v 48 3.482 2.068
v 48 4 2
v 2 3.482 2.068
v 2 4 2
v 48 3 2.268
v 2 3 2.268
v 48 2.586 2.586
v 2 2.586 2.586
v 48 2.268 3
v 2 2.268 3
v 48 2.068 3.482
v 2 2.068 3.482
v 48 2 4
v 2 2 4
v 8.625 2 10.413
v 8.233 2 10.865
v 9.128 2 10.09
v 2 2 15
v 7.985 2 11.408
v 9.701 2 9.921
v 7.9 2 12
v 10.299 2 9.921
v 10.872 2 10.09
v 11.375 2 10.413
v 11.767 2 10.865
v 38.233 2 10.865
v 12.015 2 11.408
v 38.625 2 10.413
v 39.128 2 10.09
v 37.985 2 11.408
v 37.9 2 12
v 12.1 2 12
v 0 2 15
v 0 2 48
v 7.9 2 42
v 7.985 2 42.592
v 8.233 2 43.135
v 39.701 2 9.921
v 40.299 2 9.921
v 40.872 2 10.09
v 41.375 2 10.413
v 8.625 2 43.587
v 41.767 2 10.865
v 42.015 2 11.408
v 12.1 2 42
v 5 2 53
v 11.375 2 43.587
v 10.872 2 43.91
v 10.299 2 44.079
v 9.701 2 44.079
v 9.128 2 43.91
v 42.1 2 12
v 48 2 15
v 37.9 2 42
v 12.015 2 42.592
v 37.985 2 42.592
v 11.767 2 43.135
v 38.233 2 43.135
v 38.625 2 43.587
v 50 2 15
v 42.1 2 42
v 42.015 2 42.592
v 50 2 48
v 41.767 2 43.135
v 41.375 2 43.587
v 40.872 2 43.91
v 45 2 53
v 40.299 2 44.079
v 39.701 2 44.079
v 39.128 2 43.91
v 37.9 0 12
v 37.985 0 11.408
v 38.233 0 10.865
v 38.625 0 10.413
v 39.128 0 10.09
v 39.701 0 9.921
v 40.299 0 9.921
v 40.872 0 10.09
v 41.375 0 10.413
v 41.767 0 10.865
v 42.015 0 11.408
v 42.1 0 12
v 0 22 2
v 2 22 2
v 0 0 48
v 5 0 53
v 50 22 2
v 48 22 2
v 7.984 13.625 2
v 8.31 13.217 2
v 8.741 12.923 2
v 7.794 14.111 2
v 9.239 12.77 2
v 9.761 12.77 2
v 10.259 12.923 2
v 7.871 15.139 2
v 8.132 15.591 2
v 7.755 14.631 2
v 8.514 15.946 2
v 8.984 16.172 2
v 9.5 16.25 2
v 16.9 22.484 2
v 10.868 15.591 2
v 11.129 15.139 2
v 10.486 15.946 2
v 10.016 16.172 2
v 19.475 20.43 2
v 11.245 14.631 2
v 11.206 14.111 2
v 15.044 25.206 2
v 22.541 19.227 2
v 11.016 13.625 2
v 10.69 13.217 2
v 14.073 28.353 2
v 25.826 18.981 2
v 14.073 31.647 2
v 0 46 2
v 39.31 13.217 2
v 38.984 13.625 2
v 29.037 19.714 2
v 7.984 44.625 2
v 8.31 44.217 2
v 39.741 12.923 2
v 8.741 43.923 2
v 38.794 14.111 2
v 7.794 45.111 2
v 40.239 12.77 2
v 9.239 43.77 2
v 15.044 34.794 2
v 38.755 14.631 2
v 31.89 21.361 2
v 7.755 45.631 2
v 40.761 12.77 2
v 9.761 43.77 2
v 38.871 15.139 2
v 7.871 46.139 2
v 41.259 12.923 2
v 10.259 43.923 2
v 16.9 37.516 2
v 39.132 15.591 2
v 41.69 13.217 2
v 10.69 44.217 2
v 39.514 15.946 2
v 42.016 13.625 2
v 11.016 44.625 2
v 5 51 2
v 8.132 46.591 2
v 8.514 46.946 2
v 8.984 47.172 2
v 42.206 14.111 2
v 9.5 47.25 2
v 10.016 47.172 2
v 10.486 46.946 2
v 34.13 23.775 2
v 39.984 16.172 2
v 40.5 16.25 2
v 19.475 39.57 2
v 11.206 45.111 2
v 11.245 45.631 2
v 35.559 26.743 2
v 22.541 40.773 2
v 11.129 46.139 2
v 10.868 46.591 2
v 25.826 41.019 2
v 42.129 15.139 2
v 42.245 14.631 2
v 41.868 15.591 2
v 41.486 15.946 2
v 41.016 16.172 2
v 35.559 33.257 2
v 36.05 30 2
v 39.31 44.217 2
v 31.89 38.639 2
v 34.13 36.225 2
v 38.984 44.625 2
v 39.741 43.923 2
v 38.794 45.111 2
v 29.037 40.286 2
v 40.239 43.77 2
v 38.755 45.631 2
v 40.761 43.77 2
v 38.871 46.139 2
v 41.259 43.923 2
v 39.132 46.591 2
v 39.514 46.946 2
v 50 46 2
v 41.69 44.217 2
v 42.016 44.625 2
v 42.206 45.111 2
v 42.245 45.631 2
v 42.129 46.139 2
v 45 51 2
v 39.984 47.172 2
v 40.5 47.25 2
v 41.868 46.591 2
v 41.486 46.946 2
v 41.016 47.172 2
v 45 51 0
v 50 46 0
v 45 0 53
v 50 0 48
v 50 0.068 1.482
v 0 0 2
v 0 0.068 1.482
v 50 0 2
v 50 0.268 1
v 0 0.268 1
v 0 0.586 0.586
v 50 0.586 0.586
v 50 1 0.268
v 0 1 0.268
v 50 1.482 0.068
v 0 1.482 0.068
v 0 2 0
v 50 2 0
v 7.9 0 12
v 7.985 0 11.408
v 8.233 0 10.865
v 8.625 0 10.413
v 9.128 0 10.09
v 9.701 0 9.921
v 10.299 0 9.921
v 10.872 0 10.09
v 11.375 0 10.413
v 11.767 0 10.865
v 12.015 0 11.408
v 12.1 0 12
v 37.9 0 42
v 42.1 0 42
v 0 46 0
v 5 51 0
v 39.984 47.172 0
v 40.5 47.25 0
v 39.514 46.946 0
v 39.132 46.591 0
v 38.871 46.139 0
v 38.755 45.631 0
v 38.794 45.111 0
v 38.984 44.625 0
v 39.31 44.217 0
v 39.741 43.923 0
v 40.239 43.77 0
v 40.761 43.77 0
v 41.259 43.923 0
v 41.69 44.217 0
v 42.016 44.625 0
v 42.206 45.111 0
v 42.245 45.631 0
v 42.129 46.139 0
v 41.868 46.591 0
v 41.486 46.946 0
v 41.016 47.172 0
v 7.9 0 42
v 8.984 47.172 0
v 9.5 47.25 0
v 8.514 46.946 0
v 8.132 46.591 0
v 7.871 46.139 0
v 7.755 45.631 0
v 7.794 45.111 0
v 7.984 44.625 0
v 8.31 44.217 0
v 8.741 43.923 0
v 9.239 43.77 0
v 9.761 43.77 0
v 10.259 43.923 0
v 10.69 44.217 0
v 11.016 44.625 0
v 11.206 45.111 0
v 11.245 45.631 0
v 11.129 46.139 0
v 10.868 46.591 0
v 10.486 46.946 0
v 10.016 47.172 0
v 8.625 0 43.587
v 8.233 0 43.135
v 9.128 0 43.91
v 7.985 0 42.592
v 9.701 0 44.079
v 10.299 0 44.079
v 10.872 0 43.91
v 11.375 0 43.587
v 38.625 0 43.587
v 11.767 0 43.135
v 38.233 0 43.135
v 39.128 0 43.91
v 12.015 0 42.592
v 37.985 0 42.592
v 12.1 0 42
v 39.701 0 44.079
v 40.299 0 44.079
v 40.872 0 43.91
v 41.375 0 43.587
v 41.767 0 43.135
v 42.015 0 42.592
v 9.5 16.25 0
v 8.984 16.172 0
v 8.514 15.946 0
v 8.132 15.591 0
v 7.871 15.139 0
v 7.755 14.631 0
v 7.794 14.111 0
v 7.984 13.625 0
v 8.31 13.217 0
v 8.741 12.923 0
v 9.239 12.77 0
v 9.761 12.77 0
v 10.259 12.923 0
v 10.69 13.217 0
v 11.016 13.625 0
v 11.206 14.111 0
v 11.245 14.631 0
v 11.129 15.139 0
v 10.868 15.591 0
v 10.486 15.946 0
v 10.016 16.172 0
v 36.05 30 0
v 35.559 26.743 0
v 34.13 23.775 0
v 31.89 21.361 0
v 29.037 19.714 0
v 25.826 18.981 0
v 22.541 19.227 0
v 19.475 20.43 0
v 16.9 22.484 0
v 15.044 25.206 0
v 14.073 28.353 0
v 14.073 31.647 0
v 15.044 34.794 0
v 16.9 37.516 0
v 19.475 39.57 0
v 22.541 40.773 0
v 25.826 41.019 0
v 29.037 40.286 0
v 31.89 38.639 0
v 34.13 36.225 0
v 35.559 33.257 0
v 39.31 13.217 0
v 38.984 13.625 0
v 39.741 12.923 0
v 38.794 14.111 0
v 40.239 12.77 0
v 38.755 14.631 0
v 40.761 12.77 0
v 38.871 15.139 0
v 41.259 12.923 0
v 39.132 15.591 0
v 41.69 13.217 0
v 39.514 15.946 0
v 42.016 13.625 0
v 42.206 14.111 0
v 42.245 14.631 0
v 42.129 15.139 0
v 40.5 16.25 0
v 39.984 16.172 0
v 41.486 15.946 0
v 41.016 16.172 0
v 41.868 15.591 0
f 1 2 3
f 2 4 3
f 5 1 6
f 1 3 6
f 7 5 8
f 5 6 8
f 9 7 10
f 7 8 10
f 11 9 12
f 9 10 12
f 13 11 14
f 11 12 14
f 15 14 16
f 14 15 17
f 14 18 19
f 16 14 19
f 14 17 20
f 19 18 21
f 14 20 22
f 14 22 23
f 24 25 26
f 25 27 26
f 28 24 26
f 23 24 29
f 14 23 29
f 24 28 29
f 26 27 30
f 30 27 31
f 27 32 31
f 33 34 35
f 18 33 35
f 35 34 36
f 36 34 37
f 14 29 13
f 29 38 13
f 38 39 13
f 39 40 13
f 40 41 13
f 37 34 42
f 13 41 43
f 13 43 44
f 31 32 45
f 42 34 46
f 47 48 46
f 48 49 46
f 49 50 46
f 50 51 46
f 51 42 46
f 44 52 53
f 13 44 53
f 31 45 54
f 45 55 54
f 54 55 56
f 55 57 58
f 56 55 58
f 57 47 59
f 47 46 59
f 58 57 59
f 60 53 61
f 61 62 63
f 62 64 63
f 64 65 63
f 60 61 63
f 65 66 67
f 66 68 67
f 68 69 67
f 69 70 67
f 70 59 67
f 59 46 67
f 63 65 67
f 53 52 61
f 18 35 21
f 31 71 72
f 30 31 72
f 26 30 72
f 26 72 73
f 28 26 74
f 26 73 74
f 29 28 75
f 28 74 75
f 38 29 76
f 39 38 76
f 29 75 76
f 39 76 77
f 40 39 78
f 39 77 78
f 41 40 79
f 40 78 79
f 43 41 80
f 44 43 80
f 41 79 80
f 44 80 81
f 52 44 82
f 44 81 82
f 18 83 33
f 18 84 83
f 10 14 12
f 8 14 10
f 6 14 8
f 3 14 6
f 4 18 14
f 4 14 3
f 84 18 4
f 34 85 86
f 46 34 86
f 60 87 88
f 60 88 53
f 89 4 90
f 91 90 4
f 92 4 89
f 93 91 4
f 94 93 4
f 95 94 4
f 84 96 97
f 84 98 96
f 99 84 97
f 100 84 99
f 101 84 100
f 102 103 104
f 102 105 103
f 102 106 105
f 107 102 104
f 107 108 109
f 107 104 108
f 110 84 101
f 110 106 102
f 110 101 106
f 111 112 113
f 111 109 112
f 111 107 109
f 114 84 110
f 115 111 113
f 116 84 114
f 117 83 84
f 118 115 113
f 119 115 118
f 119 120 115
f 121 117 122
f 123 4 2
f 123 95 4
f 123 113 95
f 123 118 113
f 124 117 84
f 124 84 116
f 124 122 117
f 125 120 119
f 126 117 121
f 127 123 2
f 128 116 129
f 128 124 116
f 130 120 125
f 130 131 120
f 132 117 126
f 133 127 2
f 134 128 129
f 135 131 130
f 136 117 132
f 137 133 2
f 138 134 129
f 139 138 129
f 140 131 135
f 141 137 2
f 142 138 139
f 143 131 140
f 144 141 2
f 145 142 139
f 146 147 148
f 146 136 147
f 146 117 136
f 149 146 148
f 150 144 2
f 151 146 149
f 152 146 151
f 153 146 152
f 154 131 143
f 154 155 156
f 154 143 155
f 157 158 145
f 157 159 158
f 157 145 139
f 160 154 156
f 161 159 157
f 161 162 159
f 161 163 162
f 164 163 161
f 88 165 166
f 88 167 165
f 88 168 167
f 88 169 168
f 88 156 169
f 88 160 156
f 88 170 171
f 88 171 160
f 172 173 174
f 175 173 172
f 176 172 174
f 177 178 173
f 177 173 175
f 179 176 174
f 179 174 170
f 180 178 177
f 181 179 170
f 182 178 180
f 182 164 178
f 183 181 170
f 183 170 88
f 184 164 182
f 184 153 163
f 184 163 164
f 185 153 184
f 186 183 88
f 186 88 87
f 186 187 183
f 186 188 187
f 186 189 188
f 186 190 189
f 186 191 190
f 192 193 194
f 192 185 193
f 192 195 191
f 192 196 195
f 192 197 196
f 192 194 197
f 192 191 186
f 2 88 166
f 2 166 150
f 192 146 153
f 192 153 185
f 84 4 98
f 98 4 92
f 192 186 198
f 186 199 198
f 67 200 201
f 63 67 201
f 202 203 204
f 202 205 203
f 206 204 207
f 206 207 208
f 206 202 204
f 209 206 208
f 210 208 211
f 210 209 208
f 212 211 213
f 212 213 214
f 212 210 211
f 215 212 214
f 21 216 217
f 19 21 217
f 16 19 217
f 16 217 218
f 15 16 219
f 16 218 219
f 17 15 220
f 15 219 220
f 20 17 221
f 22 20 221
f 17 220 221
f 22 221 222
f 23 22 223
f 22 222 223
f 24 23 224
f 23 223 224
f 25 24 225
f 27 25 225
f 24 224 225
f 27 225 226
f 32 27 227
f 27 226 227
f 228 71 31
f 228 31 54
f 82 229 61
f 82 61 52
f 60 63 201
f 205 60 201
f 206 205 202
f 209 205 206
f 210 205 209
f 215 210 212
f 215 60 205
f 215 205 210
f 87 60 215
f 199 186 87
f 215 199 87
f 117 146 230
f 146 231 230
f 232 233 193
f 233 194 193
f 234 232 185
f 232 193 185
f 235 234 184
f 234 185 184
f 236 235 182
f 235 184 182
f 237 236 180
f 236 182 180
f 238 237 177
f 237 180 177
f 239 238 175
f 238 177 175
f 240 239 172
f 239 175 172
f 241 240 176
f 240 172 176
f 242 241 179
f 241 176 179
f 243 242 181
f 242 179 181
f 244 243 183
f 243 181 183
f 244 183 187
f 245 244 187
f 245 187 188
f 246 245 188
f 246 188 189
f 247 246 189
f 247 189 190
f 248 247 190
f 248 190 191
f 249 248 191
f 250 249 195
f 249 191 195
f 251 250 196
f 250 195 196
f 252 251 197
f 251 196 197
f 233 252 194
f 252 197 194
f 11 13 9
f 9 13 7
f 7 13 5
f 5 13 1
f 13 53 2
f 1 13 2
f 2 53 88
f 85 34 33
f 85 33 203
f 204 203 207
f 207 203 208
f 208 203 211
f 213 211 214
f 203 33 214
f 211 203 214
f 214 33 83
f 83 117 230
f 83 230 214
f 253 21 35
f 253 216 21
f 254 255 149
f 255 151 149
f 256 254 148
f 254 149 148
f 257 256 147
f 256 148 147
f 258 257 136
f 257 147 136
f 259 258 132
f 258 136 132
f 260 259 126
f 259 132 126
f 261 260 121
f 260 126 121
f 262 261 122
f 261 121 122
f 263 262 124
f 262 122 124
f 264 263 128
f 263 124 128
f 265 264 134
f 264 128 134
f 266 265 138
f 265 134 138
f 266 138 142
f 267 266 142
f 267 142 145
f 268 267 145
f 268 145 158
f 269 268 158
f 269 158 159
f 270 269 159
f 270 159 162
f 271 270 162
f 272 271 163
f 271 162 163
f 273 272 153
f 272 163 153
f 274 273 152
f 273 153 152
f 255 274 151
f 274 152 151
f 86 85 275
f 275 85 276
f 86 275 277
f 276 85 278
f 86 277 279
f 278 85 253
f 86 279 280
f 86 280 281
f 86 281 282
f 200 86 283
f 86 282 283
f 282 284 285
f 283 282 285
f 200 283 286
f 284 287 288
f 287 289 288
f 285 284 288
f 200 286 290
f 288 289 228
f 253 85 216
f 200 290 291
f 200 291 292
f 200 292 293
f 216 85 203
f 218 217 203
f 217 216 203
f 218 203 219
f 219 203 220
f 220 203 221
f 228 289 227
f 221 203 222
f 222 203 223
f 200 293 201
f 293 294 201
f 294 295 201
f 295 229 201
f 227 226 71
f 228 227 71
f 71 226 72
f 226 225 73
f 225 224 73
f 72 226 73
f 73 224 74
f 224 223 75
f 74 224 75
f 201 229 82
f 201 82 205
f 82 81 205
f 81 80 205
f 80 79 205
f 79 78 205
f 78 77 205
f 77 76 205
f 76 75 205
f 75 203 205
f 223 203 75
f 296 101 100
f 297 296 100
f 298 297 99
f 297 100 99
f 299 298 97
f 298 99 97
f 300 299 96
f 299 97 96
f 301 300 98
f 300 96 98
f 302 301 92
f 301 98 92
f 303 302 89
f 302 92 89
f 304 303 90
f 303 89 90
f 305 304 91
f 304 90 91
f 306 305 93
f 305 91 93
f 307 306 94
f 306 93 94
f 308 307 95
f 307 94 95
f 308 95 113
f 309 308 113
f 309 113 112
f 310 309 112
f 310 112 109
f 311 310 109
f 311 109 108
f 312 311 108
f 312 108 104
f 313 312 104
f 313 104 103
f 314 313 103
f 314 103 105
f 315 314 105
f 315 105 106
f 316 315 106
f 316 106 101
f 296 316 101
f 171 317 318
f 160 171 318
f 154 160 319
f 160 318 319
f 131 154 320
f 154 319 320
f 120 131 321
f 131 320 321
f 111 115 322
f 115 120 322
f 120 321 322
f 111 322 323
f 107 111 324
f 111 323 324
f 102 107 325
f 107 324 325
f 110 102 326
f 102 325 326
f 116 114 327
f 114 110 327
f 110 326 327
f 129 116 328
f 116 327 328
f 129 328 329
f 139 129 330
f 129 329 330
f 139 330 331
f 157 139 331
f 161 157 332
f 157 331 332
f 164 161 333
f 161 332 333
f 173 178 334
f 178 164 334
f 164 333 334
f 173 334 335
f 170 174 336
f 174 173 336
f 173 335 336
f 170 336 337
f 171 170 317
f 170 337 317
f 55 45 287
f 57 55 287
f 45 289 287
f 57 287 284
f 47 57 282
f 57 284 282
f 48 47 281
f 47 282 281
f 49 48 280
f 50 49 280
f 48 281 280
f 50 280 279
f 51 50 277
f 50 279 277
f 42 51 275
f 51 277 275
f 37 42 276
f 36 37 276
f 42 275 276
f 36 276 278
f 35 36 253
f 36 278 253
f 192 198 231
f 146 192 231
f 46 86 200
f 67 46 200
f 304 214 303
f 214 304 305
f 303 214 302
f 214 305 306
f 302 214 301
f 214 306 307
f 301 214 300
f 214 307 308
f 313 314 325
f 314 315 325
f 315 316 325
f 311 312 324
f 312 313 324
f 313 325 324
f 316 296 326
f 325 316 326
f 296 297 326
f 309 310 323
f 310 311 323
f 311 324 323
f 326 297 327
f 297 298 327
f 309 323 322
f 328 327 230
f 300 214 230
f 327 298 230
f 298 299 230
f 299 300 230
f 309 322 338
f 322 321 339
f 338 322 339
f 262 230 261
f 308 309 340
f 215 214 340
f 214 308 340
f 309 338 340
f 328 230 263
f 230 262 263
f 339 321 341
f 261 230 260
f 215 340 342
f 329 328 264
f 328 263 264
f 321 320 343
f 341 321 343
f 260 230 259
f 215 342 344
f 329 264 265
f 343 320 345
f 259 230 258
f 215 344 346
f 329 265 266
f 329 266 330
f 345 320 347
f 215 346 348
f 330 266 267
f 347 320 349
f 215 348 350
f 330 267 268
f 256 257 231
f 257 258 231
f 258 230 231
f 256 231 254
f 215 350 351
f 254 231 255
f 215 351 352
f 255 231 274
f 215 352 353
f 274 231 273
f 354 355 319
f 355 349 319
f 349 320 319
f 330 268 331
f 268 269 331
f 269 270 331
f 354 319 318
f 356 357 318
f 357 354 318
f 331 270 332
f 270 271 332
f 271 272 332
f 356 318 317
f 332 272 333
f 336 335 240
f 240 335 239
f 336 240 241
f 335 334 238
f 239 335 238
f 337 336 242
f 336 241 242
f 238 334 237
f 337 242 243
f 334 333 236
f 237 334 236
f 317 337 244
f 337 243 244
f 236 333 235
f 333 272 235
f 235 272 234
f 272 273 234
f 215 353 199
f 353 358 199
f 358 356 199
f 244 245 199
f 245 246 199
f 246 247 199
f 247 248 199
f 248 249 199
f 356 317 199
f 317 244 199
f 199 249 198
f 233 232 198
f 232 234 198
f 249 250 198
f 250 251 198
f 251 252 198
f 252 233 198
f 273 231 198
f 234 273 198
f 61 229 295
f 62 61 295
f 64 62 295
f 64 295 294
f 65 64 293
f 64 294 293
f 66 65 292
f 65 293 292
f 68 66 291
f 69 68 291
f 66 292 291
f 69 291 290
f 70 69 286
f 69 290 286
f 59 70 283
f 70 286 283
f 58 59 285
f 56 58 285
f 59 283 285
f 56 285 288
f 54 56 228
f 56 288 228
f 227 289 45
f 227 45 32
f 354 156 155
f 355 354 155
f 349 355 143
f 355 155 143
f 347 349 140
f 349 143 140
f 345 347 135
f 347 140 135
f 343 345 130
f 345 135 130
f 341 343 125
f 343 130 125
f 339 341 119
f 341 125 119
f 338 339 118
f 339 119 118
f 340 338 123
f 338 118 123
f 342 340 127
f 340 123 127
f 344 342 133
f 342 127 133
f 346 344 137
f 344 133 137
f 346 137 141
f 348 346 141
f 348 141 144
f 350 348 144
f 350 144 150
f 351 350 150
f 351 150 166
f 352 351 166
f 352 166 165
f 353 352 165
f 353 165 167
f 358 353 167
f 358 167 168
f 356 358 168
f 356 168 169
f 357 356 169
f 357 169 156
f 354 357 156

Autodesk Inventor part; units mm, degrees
ref_plane "YZ Plane" through (0, 0, 0) normal (1, 0, 0) x (0, 1, 0)
ref_plane "XZ Plane" through (0, 0, 0) normal (0, 1, 0) x (-1, 0, 0)
ref_plane "XY Plane" through (0, 0, 0) normal (0, 0, 1) x (1, 0, 0)
sketch "Boceto1" plane through (0, 0, 0) normal (0, 0, 1) x (1, 0, 0)
  line L0 (0, 0) -> (50, 0)
  line L1 (50, 0) -> (50, 46)
  line L2 (45, 51) -> (5, 51)
  line L3 (0, 46) -> (0, 0)
  circle A0 centre (25, 30) radius 11.05
  line L4 (5, 51) -> (0, 46)
  line L5 (50, 46) -> (45, 51)
  point P0 (50, 51)
  point P1 (0, 51)
  point P2 (25, 0)
  point P3 (9.5, 45.5)
  point P4 (40.5, 45.5)
  point P5 (9.5, 14.5)
  point P6 (40.5, 14.5)
  dimension "d0" = 50
  dimension "d1" = 51
  dimension "d2" = 21
  dimension "d3" = 22.1
  dimension "d15" = 5
  dimension "d16" = 5
  dimension "d17" = 5
  dimension "d18" = 5
  dimension "d50" = 15.5
  dimension "d51" = 15.5
  dimension "d54" = 31
  dimension "d57" = 31
extrude "Extrusión1" add sketch "Boceto1" along normal blind 2
sketch "Boceto2" plane through (0, 0, 0) normal (0, -1, 0) x (1, 0, 0)
  line L0 (50, 2) -> (0, 2) projected
  line L1 (0, 0) -> (0, 2) projected
  line L2 (0, 0) -> (50, 0) projected
  line L3 (50, 0) -> (50, 2) projected
  line L4 (0, 0) -> (0, 48)
  line L5 (5, 53) -> (45, 53)
  line L6 (50, 48) -> (50, 0)
  line L7 (10, 44.1) -> (10, 44.1)
  line L8 (12.1, 42) -> (12.1, 12)
  line L9 (10, 9.9) -> (10, 9.9)
  line L10 (7.9, 12) -> (7.9, 42)
  arc A0 (10, 44.1) -> (7.9, 42) centre (10, 42) ccw
  arc A1 (12.1, 42) -> (10, 44.1) centre (10, 42) ccw
  arc A2 (7.9, 12) -> (10, 9.9) centre (10, 12) ccw
  arc A3 (10, 9.9) -> (12.1, 12) centre (10, 12) ccw
  line L11 (40, 44.1) -> (40, 44.1)
  line L12 (42.1, 42) -> (42.1, 12)
  line L13 (40, 9.9) -> (40, 9.9)
  line L14 (37.9, 12) -> (37.9, 42)
  arc A4 (40, 44.1) -> (37.9, 42) centre (40, 42) ccw
  arc A5 (42.1, 42) -> (40, 44.1) centre (40, 42) ccw
  arc A6 (37.9, 12) -> (40, 9.9) centre (40, 12) ccw
  arc A7 (40, 9.9) -> (42.1, 12) centre (40, 12) ccw
  line L15 (0, 48) -> (5, 53)
  line L16 (45, 53) -> (50, 48)
  point P0 (0, 53)
  point P1 (50, 53)
  point P2 (7.9, 44.1)
  point P3 (12.1, 44.1)
  point P4 (7.9, 9.9)
  point P5 (37.9, 44.1)
  point P6 (42.1, 44.1)
  point P7 (37.9, 9.9)
  dimension "d21" = 53
  dimension "d24" = 4.2
  dimension "d25" = 7.9
  dimension "d26" = 2.1
  dimension "d27" = 2.1
  dimension "d30" = 30
  dimension "d37" = 5
  dimension "d38" = 5
  dimension "d39" = 5
  dimension "d40" = 5
  dimension "d67" = 30
  dimension "d68" = 11
extrude "Extrusión2" add sketch "Boceto2" against normal blind 2 contours L0 L4 L15 L5 L16 L6
sketch "Boceto3" plane through (50, 0, 0) normal (1, 0, 0) x (0, 0, -1)
  line L0 (-2, 46) -> (-2, 2) projected
  line L1 (-2, 2) -> (-48, 2) projected
  line L2 (-2, 2) -> (-2, 22)
  line L3 (-2, 22) -> (-15, 2)
  line L4 (-15, 2) -> (-2, 2)
  dimension "d41" = 20
  dimension "d42" = 13
extrude "Extrusión3" add sketch "Boceto3" against normal blind 2
pattern_linear "Patrón rectangular1" count 2 spacing 48 along (-1, 0, 0) of "Extrusión3"
fillet "Empalme1" radius 2 1 edges at (25, 2, 2)
fillet "Empalme2" radius 2 1 edges at (25, 0, 0)
hole "Hole1" at (9.5, 45.5, 0) at (40.5, 45.5, 0) at (9.5, 14.5, 0) at (40.5, 14.5, 0) direction (0, 0, 1) diameter 3.5 end through all
equation "\"d16\" = d15"
equation "\"d17\" = d15"
equation "\"d18\" = d17"
equation "\"d38\" = d37"
equation "\"d39\" = d37"
equation "\"d40\" = d39"
properties part number "NEMA17Support"
